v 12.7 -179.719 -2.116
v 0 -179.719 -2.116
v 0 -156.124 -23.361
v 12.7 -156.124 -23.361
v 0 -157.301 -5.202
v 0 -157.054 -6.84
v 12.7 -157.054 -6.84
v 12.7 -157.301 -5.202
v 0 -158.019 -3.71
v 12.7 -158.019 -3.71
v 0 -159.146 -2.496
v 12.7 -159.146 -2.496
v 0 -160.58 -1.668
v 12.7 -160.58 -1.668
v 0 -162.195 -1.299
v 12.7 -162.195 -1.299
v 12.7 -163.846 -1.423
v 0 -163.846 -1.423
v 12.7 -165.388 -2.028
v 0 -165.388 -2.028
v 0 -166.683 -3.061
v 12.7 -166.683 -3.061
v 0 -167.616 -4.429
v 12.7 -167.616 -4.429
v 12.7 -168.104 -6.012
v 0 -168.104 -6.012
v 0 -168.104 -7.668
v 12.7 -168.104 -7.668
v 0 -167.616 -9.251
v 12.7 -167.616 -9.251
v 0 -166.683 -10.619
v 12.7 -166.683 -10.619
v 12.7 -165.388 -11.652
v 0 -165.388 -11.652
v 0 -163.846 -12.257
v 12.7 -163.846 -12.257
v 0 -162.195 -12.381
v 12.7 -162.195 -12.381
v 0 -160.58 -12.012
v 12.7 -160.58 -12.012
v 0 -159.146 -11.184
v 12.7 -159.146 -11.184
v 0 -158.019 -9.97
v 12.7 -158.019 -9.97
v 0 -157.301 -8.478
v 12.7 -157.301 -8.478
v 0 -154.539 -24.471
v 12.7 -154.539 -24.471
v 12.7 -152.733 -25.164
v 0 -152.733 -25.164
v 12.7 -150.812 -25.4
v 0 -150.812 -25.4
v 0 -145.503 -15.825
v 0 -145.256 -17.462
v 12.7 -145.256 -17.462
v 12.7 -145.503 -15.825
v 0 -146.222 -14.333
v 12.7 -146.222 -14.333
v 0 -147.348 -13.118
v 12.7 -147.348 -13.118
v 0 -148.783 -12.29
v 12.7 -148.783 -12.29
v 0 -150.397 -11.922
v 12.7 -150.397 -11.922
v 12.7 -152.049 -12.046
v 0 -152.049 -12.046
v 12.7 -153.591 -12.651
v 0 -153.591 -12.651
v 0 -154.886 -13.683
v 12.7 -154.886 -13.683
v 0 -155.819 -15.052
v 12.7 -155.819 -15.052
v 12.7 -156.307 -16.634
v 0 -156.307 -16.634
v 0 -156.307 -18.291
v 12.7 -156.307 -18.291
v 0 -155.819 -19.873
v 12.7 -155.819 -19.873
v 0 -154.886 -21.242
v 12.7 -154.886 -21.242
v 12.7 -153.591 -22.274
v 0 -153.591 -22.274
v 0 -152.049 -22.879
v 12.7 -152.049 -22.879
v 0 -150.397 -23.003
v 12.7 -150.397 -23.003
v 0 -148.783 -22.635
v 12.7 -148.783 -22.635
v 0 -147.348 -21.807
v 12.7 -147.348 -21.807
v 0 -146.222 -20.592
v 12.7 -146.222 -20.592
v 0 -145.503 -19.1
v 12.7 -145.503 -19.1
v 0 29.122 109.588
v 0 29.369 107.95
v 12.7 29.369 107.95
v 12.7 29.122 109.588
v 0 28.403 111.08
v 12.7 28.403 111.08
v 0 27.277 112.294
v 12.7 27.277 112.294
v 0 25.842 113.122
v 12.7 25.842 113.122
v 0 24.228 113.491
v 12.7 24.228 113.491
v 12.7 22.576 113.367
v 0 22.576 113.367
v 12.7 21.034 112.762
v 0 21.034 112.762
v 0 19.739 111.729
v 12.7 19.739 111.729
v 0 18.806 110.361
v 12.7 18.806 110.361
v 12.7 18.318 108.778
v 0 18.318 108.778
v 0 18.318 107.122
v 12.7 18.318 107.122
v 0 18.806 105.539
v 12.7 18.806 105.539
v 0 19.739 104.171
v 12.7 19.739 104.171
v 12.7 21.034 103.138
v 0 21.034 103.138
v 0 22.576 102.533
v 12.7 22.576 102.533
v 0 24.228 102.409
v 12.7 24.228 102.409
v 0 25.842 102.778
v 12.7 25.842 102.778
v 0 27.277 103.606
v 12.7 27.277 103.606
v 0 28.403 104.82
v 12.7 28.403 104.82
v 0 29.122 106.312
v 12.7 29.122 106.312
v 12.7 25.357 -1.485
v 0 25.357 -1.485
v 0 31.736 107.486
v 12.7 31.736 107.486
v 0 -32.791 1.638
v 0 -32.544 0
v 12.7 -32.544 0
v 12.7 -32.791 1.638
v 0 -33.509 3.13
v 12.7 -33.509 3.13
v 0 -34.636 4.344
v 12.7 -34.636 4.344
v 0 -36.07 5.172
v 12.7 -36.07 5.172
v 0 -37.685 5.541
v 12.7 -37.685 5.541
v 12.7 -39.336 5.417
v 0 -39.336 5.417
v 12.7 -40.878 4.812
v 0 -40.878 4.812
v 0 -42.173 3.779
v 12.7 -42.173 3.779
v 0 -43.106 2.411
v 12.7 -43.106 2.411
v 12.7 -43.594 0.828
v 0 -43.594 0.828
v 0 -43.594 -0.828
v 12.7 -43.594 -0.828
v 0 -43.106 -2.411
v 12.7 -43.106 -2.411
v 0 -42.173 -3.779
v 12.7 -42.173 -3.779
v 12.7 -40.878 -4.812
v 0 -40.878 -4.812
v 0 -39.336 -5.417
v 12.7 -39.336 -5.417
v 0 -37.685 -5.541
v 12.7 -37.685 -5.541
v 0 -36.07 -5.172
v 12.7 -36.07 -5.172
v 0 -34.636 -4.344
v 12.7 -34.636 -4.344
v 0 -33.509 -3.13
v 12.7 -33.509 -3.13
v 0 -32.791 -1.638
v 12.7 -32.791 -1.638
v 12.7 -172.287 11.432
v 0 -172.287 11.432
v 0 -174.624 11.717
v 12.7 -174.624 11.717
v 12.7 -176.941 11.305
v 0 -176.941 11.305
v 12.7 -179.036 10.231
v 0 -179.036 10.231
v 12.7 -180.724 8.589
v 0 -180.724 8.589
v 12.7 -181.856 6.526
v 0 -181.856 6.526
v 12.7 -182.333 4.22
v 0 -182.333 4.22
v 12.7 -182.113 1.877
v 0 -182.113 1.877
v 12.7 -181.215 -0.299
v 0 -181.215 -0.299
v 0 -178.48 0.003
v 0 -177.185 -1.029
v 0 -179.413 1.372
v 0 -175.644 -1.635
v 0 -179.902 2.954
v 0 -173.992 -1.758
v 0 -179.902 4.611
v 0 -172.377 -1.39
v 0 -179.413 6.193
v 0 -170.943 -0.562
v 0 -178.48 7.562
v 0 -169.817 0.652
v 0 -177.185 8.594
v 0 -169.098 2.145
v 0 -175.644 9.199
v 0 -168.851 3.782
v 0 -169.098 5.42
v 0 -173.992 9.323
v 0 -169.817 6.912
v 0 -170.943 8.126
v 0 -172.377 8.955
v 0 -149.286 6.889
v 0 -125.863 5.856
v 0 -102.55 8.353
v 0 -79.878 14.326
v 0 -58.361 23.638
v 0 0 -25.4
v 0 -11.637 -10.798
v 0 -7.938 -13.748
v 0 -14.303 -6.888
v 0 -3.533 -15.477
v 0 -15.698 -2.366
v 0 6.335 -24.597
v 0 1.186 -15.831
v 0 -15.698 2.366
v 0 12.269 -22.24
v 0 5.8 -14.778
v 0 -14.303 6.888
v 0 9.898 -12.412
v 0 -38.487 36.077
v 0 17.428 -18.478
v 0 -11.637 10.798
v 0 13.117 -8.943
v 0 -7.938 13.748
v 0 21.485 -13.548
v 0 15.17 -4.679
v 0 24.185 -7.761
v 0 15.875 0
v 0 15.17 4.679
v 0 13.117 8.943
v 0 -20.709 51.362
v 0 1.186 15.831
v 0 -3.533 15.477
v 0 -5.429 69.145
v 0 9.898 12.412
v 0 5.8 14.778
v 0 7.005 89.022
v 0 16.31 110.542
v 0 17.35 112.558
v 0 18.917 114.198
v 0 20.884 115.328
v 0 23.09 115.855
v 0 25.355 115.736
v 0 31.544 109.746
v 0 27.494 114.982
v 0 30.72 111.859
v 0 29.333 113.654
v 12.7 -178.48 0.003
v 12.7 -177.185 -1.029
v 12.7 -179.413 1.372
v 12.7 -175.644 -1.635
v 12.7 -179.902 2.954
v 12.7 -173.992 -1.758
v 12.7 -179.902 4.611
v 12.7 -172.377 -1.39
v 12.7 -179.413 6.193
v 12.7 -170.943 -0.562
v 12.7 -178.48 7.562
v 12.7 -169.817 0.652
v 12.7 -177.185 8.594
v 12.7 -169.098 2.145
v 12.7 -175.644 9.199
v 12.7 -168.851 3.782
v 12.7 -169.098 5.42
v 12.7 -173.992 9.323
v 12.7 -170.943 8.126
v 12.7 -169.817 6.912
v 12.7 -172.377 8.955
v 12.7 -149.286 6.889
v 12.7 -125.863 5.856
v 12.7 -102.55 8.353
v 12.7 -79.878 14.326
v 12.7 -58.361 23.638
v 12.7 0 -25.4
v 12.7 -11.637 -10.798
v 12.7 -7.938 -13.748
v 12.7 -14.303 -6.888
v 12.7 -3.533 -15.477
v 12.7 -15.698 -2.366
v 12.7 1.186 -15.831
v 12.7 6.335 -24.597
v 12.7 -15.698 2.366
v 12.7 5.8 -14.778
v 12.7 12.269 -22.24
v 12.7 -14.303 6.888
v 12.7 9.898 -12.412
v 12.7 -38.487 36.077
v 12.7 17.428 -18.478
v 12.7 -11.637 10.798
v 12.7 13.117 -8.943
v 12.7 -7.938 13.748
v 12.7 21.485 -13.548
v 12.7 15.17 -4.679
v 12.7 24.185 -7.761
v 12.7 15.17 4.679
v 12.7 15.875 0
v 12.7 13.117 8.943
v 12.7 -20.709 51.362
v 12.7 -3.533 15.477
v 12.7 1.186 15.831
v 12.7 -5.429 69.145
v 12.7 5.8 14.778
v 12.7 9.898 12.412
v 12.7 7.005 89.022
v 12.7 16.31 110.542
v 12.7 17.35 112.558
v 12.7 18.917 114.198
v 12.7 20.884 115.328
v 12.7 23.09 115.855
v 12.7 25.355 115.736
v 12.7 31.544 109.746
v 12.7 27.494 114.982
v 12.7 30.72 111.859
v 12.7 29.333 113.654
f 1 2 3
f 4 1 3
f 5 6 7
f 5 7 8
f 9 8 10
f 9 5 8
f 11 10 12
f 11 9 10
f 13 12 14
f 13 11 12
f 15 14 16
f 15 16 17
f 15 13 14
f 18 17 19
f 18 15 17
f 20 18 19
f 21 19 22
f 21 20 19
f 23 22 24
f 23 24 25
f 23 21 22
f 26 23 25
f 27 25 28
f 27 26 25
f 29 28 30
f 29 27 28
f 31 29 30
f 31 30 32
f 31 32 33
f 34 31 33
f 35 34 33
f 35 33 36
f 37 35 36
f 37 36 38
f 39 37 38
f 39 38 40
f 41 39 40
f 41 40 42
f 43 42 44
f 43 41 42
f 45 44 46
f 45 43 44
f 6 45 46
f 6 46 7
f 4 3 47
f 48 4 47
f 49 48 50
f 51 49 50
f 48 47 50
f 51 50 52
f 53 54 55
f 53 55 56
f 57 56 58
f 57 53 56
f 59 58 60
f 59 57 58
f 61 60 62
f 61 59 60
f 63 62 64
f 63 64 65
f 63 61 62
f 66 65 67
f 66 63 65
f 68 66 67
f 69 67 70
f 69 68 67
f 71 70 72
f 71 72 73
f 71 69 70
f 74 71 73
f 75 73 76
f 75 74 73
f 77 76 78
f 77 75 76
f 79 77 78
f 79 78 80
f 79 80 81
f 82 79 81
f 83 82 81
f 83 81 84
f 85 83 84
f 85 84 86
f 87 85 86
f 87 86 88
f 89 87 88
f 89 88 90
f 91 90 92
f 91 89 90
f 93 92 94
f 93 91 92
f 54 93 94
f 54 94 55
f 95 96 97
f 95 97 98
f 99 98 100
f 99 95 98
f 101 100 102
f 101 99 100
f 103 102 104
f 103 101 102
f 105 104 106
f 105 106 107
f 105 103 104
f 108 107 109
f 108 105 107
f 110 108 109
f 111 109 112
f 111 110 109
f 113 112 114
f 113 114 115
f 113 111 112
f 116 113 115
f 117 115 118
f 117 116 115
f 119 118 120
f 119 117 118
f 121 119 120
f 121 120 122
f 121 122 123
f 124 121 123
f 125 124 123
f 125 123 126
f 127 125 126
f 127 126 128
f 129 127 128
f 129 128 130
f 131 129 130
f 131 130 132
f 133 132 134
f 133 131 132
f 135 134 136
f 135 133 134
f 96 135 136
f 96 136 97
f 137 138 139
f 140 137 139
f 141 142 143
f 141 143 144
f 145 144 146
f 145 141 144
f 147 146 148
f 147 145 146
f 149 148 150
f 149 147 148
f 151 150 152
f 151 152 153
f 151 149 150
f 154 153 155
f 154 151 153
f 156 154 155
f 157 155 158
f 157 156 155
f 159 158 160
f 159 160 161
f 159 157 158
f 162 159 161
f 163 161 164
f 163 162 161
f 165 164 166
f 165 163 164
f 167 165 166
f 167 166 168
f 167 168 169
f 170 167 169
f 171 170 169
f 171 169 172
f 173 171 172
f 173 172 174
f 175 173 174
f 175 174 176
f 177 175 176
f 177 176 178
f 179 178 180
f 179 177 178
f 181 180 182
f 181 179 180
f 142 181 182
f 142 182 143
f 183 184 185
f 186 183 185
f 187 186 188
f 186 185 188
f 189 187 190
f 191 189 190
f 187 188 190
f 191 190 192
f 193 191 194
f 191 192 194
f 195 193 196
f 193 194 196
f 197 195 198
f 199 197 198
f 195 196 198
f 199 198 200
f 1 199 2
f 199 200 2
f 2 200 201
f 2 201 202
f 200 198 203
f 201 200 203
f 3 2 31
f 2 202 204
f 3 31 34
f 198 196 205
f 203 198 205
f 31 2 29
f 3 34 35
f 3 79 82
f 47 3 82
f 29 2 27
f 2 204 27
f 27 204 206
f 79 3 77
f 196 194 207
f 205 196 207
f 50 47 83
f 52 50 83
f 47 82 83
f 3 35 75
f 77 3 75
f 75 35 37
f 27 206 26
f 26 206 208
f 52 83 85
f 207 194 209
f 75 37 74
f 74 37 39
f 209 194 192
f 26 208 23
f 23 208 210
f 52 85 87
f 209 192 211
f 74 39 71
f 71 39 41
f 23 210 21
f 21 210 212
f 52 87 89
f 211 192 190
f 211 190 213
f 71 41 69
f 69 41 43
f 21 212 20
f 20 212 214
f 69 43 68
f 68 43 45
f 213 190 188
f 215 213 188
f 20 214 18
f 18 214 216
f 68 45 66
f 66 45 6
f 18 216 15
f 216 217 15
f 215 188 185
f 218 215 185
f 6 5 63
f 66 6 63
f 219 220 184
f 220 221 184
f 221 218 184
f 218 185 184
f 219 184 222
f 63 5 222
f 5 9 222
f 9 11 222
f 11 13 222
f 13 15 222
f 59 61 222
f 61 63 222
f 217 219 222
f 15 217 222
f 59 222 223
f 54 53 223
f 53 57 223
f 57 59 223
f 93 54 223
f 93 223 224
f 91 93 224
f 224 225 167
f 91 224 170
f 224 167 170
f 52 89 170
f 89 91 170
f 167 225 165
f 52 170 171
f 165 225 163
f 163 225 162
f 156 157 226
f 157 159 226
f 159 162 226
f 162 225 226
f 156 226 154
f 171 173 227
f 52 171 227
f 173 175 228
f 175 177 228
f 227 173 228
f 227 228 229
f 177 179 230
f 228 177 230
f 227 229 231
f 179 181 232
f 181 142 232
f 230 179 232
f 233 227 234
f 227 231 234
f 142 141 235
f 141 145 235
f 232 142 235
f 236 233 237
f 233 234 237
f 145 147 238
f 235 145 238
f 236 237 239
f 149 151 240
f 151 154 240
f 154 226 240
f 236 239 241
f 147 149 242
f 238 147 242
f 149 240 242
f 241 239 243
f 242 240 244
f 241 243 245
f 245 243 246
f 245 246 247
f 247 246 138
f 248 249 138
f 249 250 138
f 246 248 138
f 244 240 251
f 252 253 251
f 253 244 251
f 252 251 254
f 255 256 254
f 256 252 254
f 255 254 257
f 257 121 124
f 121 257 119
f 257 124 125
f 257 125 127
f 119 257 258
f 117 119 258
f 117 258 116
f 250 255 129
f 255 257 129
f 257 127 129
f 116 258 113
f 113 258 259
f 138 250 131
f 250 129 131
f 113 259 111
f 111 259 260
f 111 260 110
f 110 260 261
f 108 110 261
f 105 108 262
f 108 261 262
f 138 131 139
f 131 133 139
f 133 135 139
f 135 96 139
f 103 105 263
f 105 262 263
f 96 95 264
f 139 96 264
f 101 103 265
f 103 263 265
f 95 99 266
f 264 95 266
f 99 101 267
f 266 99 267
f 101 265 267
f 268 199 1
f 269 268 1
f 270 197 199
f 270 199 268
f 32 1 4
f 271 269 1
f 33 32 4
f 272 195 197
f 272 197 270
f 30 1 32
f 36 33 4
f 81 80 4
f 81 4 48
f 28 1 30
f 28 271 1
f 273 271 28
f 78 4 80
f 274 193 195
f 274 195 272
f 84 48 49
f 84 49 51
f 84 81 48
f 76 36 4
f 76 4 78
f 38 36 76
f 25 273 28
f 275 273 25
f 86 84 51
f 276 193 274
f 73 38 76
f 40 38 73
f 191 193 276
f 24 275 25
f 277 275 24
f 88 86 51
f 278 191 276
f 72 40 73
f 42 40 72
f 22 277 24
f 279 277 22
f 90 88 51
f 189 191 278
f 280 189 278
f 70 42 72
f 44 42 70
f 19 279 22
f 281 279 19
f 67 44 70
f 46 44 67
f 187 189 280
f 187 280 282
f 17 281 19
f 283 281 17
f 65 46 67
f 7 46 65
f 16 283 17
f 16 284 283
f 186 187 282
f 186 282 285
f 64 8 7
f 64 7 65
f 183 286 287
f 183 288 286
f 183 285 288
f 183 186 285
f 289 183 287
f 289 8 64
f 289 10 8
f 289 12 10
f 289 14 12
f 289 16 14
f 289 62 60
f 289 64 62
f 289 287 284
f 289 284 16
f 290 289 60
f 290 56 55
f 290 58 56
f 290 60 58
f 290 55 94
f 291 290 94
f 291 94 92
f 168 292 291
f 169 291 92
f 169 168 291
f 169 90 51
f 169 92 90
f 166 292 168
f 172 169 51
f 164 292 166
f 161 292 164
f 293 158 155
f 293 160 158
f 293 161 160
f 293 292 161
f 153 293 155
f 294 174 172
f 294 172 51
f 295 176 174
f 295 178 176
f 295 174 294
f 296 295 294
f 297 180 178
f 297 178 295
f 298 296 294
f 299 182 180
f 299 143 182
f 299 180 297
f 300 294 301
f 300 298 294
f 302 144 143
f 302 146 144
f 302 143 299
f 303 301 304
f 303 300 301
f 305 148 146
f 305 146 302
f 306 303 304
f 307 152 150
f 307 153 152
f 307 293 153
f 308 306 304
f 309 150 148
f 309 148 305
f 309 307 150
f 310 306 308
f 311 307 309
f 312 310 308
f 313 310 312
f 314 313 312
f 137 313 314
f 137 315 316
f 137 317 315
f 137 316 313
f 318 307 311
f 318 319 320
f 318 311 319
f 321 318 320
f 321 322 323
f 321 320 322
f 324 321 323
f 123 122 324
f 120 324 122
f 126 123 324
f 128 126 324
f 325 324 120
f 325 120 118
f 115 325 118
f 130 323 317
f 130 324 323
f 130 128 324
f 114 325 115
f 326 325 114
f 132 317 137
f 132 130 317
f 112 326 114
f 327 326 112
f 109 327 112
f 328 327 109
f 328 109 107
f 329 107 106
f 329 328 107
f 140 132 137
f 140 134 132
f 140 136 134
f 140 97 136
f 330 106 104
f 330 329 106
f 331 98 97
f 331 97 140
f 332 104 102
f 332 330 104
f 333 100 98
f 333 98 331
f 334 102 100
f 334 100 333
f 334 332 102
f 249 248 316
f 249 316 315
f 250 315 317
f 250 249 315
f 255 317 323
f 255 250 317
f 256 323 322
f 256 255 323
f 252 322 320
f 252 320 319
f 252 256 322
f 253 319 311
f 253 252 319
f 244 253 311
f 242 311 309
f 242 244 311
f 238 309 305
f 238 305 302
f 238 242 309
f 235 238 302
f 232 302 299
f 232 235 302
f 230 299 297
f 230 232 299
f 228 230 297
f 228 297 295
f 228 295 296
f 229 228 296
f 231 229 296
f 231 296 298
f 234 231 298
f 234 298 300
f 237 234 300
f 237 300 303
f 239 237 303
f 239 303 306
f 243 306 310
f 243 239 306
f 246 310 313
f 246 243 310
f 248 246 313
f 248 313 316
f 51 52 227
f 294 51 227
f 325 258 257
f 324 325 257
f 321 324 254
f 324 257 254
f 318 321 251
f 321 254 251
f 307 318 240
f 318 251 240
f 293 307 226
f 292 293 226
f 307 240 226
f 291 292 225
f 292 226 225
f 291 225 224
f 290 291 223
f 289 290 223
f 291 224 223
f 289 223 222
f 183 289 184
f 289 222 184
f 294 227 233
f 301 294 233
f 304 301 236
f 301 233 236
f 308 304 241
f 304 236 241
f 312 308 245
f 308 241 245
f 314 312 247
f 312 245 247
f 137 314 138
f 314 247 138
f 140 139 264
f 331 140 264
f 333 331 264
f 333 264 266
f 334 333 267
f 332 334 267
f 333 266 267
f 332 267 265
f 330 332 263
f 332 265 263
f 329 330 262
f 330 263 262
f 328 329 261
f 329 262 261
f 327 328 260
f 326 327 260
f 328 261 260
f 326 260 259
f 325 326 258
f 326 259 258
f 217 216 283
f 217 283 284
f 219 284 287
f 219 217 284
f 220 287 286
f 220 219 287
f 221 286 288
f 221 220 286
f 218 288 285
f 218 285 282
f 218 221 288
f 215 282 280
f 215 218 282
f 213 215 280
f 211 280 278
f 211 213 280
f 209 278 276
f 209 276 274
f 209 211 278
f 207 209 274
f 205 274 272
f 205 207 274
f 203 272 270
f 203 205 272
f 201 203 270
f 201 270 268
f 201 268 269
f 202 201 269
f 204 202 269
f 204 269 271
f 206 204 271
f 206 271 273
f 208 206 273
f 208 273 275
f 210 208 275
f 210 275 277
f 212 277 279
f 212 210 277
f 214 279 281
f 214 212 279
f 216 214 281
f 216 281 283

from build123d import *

# Parameters (mm, degrees)
F0_R     = 5.55625
F0_R_2   = 15.875
F1_DEPTH = 12.7


with BuildPart() as f1:
    # F0 (on Right) → F1 (new body)
    with BuildSketch(Plane.YZ):
        with BuildLine():
            Line((-150.8125, -25.4), (0, -25.4))
            ThreePointArc((0, -25.4), (17.427746, -18.477923), (25.35658, -1.48454))
            Line((25.35658, -1.48454), (31.736431, 107.486081))
            ThreePointArc((31.736431, 107.486081), (25.355158, 115.736149), (16.31029, 110.54244))
            ThreePointArc((16.31029, 110.54244), (-58.360854, 23.637711), (-172.287236, 11.431516))
            ThreePointArc((-172.287236, 11.431516), (-181.366639, 7.599748), (-179.718572, -2.116315))
            Line((-179.718572, -2.116315), (-156.123724, -23.361212))
            ThreePointArc((-156.123724, -23.361212), (-153.657046, -24.872795), (-150.8125, -25.4))
        make_face()
        with Locations((-150.8125, -17.4625)):
            Circle(F0_R, mode=Mode.SUBTRACT)
        with Locations((-162.609924, -6.840052)):
            Circle(F0_R, mode=Mode.SUBTRACT)
        with Locations((-174.407348, 3.782397)):
            Circle(F0_R, mode=Mode.SUBTRACT)
        with Locations((-38.1, 0)):
            Circle(F0_R, mode=Mode.SUBTRACT)
        Circle(F0_R_2, mode=Mode.SUBTRACT)
        with Locations((23.8125, 107.95)):
            Circle(F0_R, mode=Mode.SUBTRACT)
    extrude(amount=F1_DEPTH)


solid = f1.part
